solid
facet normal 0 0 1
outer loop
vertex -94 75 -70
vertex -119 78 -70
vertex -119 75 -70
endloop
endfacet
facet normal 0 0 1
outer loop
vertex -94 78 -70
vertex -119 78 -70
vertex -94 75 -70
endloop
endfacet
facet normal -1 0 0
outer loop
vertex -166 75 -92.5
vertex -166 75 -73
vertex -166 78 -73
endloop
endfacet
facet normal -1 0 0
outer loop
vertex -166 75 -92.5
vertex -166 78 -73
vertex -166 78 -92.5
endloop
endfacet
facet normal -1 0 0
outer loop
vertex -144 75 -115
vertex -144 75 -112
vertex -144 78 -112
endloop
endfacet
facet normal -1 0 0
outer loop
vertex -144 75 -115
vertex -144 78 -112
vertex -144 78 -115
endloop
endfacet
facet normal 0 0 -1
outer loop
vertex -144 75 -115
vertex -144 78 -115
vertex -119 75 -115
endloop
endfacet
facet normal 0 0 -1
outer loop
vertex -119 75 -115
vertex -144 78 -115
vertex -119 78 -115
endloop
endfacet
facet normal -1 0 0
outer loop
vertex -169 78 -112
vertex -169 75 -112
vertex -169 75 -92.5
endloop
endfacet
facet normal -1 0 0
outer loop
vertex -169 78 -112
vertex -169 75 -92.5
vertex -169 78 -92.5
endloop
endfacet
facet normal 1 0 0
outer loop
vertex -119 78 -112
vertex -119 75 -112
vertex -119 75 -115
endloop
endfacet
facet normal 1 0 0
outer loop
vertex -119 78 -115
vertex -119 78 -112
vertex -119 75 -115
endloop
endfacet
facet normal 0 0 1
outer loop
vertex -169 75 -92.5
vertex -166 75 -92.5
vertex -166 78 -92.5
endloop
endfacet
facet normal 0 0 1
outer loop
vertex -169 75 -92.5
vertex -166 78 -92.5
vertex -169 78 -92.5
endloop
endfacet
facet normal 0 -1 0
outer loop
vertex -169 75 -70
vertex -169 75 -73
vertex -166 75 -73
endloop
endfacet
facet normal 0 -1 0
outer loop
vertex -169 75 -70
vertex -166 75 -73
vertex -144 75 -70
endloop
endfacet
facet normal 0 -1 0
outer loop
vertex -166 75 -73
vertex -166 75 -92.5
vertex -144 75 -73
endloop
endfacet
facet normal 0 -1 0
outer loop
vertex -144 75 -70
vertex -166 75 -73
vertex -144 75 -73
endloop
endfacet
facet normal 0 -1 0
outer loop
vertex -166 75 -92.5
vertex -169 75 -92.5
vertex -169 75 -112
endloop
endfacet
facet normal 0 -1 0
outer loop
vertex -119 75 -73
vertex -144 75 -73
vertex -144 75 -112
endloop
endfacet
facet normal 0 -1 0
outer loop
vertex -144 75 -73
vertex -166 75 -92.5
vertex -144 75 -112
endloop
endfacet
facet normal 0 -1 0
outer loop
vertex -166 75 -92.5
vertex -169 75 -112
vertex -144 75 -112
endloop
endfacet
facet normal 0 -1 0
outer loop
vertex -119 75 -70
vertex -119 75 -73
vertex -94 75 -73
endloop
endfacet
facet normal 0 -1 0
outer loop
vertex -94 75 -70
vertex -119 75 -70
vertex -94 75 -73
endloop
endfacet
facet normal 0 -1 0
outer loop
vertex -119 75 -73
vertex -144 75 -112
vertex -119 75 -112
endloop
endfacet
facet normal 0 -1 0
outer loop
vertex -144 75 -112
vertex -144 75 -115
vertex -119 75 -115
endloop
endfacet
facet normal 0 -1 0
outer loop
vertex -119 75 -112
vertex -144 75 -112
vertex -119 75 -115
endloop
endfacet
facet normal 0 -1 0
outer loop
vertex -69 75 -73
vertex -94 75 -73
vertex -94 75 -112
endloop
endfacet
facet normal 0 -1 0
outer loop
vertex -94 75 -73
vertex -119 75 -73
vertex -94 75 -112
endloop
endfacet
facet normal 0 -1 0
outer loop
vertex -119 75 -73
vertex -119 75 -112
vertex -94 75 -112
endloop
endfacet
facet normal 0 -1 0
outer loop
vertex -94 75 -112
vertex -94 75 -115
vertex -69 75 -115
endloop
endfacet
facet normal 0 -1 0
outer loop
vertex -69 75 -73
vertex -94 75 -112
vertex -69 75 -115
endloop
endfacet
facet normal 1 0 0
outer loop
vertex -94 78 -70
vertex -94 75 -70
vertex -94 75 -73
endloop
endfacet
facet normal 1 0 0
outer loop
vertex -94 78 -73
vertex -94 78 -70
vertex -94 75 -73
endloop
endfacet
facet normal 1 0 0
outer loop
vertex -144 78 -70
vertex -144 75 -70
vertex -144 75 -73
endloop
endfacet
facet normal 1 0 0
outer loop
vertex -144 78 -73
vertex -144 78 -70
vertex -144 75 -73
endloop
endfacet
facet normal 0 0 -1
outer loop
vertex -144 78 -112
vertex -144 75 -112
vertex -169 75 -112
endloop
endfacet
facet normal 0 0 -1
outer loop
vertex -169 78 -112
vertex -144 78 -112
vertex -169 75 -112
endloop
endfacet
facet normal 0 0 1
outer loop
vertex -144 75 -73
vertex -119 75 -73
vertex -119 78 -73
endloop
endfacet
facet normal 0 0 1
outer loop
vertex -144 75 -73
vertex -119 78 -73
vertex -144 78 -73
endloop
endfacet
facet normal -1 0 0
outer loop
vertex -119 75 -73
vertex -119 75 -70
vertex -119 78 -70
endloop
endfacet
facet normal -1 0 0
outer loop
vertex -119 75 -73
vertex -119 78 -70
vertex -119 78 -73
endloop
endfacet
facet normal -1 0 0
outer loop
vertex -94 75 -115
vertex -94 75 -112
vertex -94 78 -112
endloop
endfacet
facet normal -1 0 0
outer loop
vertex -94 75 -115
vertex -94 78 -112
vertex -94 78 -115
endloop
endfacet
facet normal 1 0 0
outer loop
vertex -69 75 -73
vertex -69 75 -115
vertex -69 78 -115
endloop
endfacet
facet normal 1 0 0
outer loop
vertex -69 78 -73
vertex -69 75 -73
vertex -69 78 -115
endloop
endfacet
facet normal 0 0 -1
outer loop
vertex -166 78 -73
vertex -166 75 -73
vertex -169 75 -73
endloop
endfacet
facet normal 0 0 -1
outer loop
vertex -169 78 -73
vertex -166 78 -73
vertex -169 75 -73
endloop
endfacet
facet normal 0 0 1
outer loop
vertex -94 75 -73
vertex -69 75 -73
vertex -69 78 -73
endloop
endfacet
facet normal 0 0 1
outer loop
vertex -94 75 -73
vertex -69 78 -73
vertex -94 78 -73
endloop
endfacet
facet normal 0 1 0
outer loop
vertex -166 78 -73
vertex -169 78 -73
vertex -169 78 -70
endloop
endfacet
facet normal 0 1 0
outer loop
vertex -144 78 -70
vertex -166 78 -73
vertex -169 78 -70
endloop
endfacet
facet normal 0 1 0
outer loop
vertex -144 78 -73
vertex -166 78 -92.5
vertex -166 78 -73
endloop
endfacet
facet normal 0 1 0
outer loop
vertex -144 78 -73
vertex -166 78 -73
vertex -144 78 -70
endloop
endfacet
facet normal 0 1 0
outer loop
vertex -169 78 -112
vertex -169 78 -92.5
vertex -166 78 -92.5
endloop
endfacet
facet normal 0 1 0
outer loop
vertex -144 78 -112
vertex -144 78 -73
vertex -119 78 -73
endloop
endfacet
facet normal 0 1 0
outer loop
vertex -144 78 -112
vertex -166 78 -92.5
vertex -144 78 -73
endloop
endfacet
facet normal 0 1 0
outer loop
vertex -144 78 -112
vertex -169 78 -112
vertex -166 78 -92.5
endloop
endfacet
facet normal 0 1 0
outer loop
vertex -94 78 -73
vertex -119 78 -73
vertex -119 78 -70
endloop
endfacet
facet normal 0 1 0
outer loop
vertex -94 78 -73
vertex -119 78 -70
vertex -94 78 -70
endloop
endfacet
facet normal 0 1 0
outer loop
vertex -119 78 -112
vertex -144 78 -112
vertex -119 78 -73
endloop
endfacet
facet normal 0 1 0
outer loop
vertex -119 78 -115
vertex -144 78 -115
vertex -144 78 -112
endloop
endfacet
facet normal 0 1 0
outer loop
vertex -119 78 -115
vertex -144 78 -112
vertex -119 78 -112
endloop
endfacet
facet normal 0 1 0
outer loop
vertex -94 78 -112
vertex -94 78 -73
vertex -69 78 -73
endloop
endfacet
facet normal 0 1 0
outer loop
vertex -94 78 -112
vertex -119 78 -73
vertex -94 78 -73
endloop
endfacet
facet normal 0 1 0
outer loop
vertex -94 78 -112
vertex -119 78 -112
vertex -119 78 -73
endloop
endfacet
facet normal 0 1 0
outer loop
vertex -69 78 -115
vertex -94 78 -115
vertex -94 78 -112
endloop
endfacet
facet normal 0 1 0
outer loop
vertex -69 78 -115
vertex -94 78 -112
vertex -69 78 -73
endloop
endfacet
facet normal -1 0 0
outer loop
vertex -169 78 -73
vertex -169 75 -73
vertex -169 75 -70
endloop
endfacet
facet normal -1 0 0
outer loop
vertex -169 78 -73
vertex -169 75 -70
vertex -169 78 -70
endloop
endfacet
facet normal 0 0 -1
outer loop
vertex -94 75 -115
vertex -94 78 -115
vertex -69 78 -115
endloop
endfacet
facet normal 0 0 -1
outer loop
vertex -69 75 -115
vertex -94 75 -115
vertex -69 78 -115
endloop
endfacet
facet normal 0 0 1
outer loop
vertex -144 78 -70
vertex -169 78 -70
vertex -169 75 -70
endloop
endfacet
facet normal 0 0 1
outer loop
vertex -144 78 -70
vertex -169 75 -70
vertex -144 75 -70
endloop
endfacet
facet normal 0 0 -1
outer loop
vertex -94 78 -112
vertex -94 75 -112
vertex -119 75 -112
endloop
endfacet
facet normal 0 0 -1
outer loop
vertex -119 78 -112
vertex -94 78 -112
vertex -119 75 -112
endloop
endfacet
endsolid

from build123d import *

# Parameters (mm, degrees)
RECTANGLE127_AS_DRAWN_W                      = 25
RECTANGLE127_AS_DRAWN_H                      = 3
EXTRUDE155_DEPTH                             = 3
EXTRUDE155_ONTO_RECTANGLE127_ROLL_ANGLE      = -90
EXTRUDE155_ONTO_RECTANGLE127_PLACEMENT_ANGLE = 180
RECTANGLE128_AS_DRAWN_W                      = 25
RECTANGLE128_AS_DRAWN_H                      = 3
EXTRUDE157_DEPTH                             = 3
EXTRUDE157_ONTO_RECTANGLE128_ROLL_ANGLE      = -90
EXTRUDE157_ONTO_RECTANGLE128_PLACEMENT_ANGLE = 180
RECTANGLE130_AS_DRAWN_W                      = 25
RECTANGLE130_AS_DRAWN_H                      = 3
EXTRUDE162_DEPTH                             = 3
EXTRUDE162_ONTO_RECTANGLE130_ROLL_ANGLE      = -90
EXTRUDE162_ONTO_RECTANGLE130_PLACEMENT_ANGLE = 180
EXTRUDE160_DEPTH                             = 3
EXTRUDE160_ONTO_RECTANGLE127_ROLL_ANGLE      = -90
EXTRUDE160_ONTO_RECTANGLE127_PLACEMENT_ANGLE = 180
RECTANGLE132_AS_DRAWN_W                      = 3
RECTANGLE132_AS_DRAWN_H                      = 19.5
EXTRUDE168_DEPTH                             = 3
EXTRUDE168_ONTO_RECTANGLE132_ROLL_ANGLE      = -90
EXTRUDE168_ONTO_RECTANGLE132_PLACEMENT_ANGLE = 180
BOX043_W                                     = 100
BOX043_H                                     = 3
BOX043_DEPTH                                 = 45


with BuildPart() as extrude155:
    # Rectangle127 as drawn → Extrude155 (new)
    with BuildSketch(Plane.XY):
        with Locations((12.5, 1.5)):
            Rectangle(RECTANGLE127_AS_DRAWN_W, RECTANGLE127_AS_DRAWN_H)
    extrude(amount=-EXTRUDE155_DEPTH)


with BuildPart() as extrude155_1:
    # Extrude155 onto Rectangle127 roll: moved
    add(extrude155.part.rotate(Axis((0, 0, 0), (1, 0, 0)), EXTRUDE155_ONTO_RECTANGLE127_ROLL_ANGLE))


with BuildPart() as extrude155_2:
    # Extrude155 onto Rectangle127 placement: moved
    add(extrude155_1.part.moved(Location((114, -77, -70))).rotate(Axis((114, -77, -70), (0, 0, 1)), EXTRUDE155_ONTO_RECTANGLE127_PLACEMENT_ANGLE))


with BuildPart() as extrude155_3:
    # Extrude155 placement: moved
    add(extrude155_2.part.moved(Location((-183, 0, 0))))


with BuildPart() as extrude157:
    # Rectangle128 as drawn → Extrude157 (new)
    with BuildSketch(Plane.XY):
        with Locations((12.5, 1.5)):
            Rectangle(RECTANGLE128_AS_DRAWN_W, RECTANGLE128_AS_DRAWN_H)
    extrude(amount=-EXTRUDE157_DEPTH)


with BuildPart() as extrude157_1:
    # Extrude157 onto Rectangle128 roll: moved
    add(extrude157.part.rotate(Axis((0, 0, 0), (1, 0, 0)), EXTRUDE157_ONTO_RECTANGLE128_ROLL_ANGLE))


with BuildPart() as extrude157_2:
    # Extrude157 onto Rectangle128 placement: moved
    add(extrude157_1.part.moved(Location((89, -77, -70))).rotate(Axis((89, -77, -70), (0, 0, 1)), EXTRUDE157_ONTO_RECTANGLE128_PLACEMENT_ANGLE))


with BuildPart() as extrude157_3:
    # Extrude157 placement: moved
    add(extrude157_2.part.moved(Location((-208, 0, 0))))


with BuildPart() as extrude162:
    # Rectangle130 as drawn → Extrude162 (new)
    with BuildSketch(Plane.XY):
        with Locations((12.5, 1.5)):
            Rectangle(RECTANGLE130_AS_DRAWN_W, RECTANGLE130_AS_DRAWN_H)
    extrude(amount=-EXTRUDE162_DEPTH)


with BuildPart() as extrude162_1:
    # Extrude162 onto Rectangle130 roll: moved
    add(extrude162.part.rotate(Axis((0, 0, 0), (1, 0, 0)), EXTRUDE162_ONTO_RECTANGLE130_ROLL_ANGLE))


with BuildPart() as extrude162_2:
    # Extrude162 onto Rectangle130 placement: moved
    add(extrude162_1.part.moved(Location((39, -77, -70))).rotate(Axis((39, -77, -70), (0, 0, 1)), EXTRUDE162_ONTO_RECTANGLE130_PLACEMENT_ANGLE))


with BuildPart() as extrude162_3:
    # Extrude162 placement: moved
    add(extrude162_2.part.moved(Location((-183, 0, -42))))


with BuildPart() as extrude160:
    # Rectangle127 as drawn → Extrude160 (new)
    with BuildSketch(Plane.XY):
        with Locations((12.5, 1.5)):
            Rectangle(RECTANGLE127_AS_DRAWN_W, RECTANGLE127_AS_DRAWN_H)
    extrude(amount=-EXTRUDE160_DEPTH)


with BuildPart() as extrude160_1:
    # Extrude160 onto Rectangle127 roll: moved
    add(extrude160.part.rotate(Axis((0, 0, 0), (1, 0, 0)), EXTRUDE160_ONTO_RECTANGLE127_ROLL_ANGLE))


with BuildPart() as extrude160_2:
    # Extrude160 onto Rectangle127 placement: moved
    add(extrude160_1.part.moved(Location((114, -77, -70))).rotate(Axis((114, -77, -70), (0, 0, 1)), EXTRUDE160_ONTO_RECTANGLE127_PLACEMENT_ANGLE))


with BuildPart() as extrude160_3:
    # Extrude160 placement: moved
    add(extrude160_2.part.moved(Location((-208, 0, -42))))


with BuildPart() as fusion064027:
    # Rectangle132 as drawn → Extrude168 (new)
    with BuildSketch(Plane.XY):
        with Locations((1.5, 9.75)):
            Rectangle(RECTANGLE132_AS_DRAWN_W, RECTANGLE132_AS_DRAWN_H)
    extrude(amount=-EXTRUDE168_DEPTH)


with BuildPart() as fusion064027_1:
    # Extrude168 onto Rectangle132 roll: moved
    add(fusion064027.part.rotate(Axis((0, 0, 0), (1, 0, 0)), EXTRUDE168_ONTO_RECTANGLE132_ROLL_ANGLE))


with BuildPart() as fusion064027_2:
    # Extrude168 onto Rectangle132 placement: moved
    add(fusion064027_1.part.moved(Location((114, -77, -92.5))).rotate(Axis((114, -77, -92.5), (0, 0, 1)), EXTRUDE168_ONTO_RECTANGLE132_PLACEMENT_ANGLE))


with BuildPart() as fusion064027_3:
    # Extrude168 placement: moved
    add(fusion064027_2.part.moved(Location((-280, 0, 19.5))))

    # Fusion064027: union Extrude155, Extrude157, Extrude162, Extrude160
    add(extrude155_3.part)
    add(extrude157_3.part)
    add(extrude162_3.part)
    add(extrude160_3.part)


with BuildPart() as fusion064027_4:
    # Fusion064027 placement: moved
    add(fusion064027_3.part.moved(Location((0, 152, 0))))


with BuildPart() as cut035016:
    # Box043 → Box043 (new body)
    with BuildSketch(Plane(origin=(-169, 75, -115), x_dir=(1, 0, 0), z_dir=(0, 0, 1))):
        with Locations((50, 1.5)):
            Rectangle(BOX043_W, BOX043_H)
    extrude(amount=BOX043_DEPTH)

    # Cut035016: cut Fusion064027
    add(fusion064027_4.part, mode=Mode.SUBTRACT)


solid = cut035016.part
